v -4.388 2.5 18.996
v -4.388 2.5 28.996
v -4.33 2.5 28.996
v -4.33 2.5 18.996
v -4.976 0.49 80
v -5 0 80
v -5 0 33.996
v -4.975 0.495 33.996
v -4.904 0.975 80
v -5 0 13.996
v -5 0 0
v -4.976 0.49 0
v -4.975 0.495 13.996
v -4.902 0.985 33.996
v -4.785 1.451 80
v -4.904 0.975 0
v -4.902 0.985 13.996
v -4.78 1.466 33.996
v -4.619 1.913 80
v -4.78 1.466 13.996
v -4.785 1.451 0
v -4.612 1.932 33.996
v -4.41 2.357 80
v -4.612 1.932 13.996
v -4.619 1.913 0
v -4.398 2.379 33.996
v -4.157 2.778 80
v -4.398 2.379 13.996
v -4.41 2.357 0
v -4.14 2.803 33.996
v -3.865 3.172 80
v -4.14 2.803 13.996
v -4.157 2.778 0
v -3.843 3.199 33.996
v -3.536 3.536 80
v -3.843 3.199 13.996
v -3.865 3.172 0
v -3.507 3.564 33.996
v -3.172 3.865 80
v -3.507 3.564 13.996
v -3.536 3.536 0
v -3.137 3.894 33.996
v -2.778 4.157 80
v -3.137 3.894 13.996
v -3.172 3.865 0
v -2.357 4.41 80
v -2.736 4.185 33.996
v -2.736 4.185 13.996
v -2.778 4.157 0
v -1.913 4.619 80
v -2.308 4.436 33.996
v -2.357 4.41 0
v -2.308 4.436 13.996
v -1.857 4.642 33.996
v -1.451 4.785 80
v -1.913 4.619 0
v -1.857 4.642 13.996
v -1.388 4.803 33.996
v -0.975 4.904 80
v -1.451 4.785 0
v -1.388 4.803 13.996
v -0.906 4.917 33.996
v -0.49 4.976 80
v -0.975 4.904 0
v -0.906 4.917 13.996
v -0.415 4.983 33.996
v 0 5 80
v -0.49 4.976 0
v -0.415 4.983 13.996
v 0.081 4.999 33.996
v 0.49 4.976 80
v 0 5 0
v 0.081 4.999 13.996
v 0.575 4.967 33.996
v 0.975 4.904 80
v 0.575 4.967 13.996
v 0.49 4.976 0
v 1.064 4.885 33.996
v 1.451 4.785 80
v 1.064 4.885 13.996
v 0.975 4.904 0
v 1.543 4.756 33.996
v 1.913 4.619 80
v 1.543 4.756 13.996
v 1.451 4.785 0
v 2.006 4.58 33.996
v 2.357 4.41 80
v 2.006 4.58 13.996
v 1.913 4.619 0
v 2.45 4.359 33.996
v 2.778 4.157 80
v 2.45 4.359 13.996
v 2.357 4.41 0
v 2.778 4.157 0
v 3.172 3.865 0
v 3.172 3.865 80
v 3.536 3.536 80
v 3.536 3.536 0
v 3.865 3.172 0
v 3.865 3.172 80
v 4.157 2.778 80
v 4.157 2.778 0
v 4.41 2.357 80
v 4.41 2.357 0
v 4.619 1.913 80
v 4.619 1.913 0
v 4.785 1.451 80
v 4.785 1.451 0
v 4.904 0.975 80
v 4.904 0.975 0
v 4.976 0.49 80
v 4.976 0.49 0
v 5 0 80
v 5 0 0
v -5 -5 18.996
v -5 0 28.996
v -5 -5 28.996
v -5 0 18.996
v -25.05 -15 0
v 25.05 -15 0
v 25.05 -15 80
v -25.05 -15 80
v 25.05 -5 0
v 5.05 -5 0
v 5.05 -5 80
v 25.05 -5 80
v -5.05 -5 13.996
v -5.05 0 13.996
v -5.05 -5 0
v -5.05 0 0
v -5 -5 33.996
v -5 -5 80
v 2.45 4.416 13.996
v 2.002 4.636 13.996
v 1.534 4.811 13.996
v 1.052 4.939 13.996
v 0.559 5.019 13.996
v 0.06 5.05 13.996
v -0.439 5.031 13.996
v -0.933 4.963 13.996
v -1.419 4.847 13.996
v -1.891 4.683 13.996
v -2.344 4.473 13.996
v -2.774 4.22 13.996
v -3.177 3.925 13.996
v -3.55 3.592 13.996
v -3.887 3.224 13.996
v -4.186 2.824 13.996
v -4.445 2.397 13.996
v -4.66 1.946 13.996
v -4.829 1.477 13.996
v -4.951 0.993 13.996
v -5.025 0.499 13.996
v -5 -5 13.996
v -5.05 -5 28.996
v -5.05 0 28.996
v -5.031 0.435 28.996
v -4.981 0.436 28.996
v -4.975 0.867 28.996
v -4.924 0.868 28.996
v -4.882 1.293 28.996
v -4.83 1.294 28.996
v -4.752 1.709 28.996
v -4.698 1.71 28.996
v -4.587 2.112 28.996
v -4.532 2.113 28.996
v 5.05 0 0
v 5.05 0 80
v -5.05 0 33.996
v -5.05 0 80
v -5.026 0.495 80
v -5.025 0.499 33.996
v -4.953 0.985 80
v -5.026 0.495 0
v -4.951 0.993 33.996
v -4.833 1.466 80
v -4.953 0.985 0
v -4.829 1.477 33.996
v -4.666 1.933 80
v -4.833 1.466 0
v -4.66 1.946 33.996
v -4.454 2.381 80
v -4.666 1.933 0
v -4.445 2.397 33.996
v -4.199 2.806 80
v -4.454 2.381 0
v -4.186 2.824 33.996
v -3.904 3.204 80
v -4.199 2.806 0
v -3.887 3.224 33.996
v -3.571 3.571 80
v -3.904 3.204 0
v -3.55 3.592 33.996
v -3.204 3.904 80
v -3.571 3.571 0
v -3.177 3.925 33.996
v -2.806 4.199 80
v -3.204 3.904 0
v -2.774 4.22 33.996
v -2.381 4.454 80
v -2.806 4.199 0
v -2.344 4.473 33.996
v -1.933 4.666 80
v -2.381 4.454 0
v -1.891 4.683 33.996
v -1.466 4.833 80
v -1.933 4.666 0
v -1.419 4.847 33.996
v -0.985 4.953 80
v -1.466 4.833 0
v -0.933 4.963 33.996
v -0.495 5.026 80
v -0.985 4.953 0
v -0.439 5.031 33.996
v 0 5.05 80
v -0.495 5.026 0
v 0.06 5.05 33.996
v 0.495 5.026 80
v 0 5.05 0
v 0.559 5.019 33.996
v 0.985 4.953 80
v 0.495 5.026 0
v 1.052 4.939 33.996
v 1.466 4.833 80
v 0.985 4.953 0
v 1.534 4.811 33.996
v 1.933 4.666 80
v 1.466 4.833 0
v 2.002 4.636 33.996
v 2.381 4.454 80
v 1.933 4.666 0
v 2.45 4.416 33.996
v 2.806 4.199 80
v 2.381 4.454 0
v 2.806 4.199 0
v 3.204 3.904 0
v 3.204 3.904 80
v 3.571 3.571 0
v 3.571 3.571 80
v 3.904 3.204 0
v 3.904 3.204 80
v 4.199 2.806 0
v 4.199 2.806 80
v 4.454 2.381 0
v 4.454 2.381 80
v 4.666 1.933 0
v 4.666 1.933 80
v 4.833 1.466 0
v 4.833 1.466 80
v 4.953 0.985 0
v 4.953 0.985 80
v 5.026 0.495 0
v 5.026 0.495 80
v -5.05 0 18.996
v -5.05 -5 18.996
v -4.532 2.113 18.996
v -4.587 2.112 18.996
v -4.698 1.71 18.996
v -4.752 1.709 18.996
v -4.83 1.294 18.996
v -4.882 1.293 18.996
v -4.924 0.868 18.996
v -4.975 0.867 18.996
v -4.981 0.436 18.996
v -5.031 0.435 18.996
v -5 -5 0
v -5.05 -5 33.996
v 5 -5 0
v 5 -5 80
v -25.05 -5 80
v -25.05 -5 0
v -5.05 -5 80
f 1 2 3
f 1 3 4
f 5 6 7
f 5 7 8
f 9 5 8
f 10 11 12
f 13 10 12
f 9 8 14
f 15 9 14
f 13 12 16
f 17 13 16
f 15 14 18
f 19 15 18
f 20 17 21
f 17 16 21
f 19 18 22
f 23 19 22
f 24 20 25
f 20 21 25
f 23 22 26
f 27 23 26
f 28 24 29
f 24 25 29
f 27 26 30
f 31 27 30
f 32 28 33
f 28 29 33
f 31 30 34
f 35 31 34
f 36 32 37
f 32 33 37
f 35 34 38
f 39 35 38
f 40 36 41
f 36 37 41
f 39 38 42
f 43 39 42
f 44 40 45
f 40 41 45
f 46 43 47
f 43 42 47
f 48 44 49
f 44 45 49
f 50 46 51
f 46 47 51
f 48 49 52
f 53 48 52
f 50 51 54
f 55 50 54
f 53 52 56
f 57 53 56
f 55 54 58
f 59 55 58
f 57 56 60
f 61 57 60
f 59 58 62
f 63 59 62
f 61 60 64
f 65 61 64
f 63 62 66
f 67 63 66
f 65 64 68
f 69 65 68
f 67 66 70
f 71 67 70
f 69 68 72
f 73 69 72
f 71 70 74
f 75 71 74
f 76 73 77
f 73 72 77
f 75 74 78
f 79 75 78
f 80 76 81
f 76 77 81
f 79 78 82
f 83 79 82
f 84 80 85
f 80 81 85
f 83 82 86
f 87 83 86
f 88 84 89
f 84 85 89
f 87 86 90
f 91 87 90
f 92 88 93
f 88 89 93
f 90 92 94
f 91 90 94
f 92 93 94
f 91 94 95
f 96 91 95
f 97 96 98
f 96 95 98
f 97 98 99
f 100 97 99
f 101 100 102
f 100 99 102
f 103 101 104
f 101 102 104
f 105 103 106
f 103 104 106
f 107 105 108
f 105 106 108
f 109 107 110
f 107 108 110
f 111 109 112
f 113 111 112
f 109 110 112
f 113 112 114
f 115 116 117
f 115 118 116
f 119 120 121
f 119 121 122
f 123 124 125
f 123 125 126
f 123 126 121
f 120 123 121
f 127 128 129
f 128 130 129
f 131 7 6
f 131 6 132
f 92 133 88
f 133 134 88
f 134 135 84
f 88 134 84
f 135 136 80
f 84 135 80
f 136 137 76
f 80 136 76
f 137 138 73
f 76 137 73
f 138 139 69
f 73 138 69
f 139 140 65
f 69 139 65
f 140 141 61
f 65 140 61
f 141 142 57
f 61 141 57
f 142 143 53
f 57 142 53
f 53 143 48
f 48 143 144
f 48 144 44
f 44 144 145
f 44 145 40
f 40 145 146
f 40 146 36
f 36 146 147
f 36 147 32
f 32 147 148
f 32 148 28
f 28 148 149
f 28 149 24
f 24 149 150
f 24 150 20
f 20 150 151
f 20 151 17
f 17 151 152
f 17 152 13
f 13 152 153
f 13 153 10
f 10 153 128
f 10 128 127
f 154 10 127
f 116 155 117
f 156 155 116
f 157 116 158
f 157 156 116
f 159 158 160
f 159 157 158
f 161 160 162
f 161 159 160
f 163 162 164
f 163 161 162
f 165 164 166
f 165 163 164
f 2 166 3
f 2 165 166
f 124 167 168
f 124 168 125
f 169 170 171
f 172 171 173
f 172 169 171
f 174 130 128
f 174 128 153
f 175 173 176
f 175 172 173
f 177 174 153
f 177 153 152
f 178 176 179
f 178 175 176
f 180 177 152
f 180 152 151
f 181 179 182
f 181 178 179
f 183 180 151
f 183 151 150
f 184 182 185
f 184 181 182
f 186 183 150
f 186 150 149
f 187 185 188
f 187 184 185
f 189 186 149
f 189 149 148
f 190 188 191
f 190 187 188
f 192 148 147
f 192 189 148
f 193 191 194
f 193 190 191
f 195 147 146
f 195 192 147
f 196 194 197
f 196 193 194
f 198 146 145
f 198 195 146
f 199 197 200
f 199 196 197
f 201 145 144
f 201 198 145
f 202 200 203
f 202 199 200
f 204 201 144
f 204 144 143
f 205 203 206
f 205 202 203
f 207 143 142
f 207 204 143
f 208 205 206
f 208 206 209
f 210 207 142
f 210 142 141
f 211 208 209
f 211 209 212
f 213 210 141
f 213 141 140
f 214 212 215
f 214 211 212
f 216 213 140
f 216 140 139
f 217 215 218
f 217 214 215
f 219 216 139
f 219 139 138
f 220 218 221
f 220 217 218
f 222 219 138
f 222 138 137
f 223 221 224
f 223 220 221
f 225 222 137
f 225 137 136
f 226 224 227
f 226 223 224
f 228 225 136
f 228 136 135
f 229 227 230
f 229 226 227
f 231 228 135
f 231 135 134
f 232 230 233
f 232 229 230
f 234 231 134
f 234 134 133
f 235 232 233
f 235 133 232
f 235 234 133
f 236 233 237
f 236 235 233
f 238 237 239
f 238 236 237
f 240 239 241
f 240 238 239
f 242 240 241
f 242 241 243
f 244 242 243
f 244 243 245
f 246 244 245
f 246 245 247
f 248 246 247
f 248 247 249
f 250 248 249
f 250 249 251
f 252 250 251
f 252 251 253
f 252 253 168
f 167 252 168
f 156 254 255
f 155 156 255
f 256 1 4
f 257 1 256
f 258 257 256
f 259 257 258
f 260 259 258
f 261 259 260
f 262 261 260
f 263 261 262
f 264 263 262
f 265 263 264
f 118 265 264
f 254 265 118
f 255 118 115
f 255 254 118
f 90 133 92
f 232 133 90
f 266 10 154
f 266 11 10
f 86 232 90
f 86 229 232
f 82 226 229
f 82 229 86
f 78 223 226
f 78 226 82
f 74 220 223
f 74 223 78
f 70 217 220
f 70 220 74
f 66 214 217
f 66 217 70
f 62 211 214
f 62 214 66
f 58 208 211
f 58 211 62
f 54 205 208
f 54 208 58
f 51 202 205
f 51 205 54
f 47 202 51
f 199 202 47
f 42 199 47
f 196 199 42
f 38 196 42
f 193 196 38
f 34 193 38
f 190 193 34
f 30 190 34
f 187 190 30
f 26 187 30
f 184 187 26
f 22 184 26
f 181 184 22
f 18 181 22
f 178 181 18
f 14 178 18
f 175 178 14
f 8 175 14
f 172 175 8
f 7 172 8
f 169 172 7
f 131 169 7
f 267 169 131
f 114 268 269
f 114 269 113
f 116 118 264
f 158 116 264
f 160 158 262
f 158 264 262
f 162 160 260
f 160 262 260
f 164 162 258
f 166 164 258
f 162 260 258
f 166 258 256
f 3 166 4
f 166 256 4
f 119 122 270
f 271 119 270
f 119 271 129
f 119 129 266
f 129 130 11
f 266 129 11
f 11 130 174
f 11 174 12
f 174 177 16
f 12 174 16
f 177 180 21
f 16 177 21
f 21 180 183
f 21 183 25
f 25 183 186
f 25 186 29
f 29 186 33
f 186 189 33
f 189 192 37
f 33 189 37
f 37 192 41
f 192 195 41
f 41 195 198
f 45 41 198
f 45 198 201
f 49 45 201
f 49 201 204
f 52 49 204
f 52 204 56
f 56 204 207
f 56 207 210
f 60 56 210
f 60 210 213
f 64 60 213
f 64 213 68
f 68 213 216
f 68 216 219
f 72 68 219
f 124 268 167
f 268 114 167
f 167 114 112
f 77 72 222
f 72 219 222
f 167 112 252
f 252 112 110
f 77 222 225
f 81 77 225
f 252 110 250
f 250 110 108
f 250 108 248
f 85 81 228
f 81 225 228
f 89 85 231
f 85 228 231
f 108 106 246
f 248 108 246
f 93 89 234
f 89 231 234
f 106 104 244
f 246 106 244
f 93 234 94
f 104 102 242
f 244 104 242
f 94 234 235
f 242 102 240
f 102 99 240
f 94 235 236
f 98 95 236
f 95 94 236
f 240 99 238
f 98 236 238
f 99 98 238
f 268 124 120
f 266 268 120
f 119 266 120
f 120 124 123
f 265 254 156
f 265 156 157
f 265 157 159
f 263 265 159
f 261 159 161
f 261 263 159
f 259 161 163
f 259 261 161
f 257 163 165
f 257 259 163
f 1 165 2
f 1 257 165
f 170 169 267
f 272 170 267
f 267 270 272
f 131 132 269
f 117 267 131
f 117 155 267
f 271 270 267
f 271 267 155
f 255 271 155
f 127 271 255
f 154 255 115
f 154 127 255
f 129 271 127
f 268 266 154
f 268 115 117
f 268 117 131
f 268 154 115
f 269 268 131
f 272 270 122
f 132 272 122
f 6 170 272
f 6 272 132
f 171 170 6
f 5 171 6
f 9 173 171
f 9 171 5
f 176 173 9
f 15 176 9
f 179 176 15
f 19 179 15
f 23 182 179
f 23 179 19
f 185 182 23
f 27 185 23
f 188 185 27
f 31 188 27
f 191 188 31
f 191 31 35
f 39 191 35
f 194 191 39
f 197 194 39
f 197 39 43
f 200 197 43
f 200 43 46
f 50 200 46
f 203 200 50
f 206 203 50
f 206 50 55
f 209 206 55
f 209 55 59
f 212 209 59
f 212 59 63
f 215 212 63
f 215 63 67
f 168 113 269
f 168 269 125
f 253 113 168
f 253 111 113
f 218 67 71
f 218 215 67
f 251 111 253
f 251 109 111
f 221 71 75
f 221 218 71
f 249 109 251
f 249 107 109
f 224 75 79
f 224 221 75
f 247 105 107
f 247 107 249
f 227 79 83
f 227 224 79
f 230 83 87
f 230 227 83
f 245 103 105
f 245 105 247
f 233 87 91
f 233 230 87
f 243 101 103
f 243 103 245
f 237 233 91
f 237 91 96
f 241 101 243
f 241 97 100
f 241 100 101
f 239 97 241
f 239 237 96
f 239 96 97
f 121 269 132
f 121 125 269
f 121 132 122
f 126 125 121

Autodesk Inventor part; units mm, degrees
ref_plane "YZ Plane" through (0, 0, 0) normal (1, 0, 0) x (0, 1, 0)
ref_plane "XZ Plane" through (0, 0, 0) normal (0, 1, 0) x (-1, 0, 0)
ref_plane "XY Plane" through (0, 0, 0) normal (0, 0, 1) x (1, 0, 0)
sketch "эскиз_корпус" plane through (0, 0, 0) normal (0, 0, 1) x (1, 0, 0)
  line L0 (0.9426, 4.9612) -> (-0.95, -5)
  line L1 (-5.05, 0) -> (5.05, 0)
  arc A0 (5.05, 0) -> (-5.05, 0) centre (0, 0) ccw
  line L2 (-5.05, 0) -> (-5.05, -5)
  line L3 (5.05, 0) -> (5.05, -5)
  arc A1 (5, 0) -> (-5, 0) centre (0, 0) ccw
  line L4 (-5.05, -5) -> (-5, -5)
  line L5 (5, -5) -> (5.05, -5)
  line L6 (5.05, -5) -> (25.05, -5)
  line L7 (-25.05, -5) -> (-5.05, -5)
  line L8 (-0.95, -5) -> (5, -5)
  line L9 (-0.95, -5) -> (-5, -5)
  line L10 (5, -5) -> (5, 0)
  line L11 (-5, 0) -> (-5, -5)
  line L12 (25.05, -5) -> (25.05, -15)
  line L13 (25.05, -15) -> (-25.05, -15)
  line L14 (-25.05, -15) -> (-25.05, -5)
  dimension "d33" = 5
  dimension "d34" = 5
  dimension "d52" = 0.05
  dimension "d85" = 10
  dimension "d89" = 20
  dimension "d91" = 20
extrude "корпус_общий" add sketch "эскиз_корпус" along normal blind 80
sketch "эскиз_отверстие_ручка" plane through (-5.05, -5, 0) normal (-1, 0, 0) x (0, 0, 1)
  line L0 (0, 0) -> (80, 0) projected
  line L1 (0, 5) -> (80, 5) projected
  line L2 (13.9957, 20) -> (13.9957, 0)
  line L3 (0, 0) -> (80, 0) projected
  line L4 (13.9957, 20) -> (33.9957, 20)
  line L5 (33.9957, 20) -> (33.9957, 0)
  line L6 (28.9957, 0) -> (28.9957, 7.5)
  line L7 (28.9957, 7.5) -> (18.9957, 7.5)
  line L8 (18.9957, 7.5) -> (18.9957, 0)
  line L9 (0, 5) -> (0, 5) projected
  line L10 (0, 5) -> (80, 5) projected
  line L11 (80, 5) -> (80, 5) projected
  line L12 (0, 5) -> (80, 5) projected
  line L13 (0, 10.05) -> (80, 10.05) projected
  line L14 (0, 5) -> (0, 10.05) projected
  line L15 (80, 5) -> (80, 10.05) projected
  dimension "d77" = 5
  dimension "d78" = 5
  dimension "d79" = 10
  dimension "d87" = 12.5
  dimension "d92" = 20
extrude "отверстие_ручка" cut sketch "эскиз_отверстие_ручка" against normal blind 7.5 contours L2 L1 L8 L0 | L2 L13 L5 L1 L6 L7 L8 | L6 L1 L5 L0 | L2 L4 L5 L13
extrude "отверстие_цилиндр" cut sketch "эскиз_корпус" along normal blind 80 contours A1 L1 L0 | L0 L1 A1 | L1 L10 L8 L0 | L0 L9 L11 L1
equation "\"d33\" = diametr_ruchka_"
equation "\"d34\" = diametr_ruchka_"
equation "\"d85\" = diametr_"
equation "\"d89\" = 2 * diametr_"
equation "\"d91\" = 2 * diametr_"
equation "\"d74\" = length"
equation "\"d77\" = diametr_ruchka_"
equation "\"d78\" = diametr_ruchka_"
equation "\"d79\" = diametr_"
equation "\"d87\" = 2.5 * diametr_ruchka_"
equation "\"d92\" = 2 * diametr_"
equation "\"d81\" = 1.5 * diametr_ruchka_"
equation "\"d83\" = length"
equation "\"diametr_ruchka_\" = 5"
equation "\"diametr_\" = 10"
equation "\"length\" = 80"
properties part number "lw_5_корпус_new"
